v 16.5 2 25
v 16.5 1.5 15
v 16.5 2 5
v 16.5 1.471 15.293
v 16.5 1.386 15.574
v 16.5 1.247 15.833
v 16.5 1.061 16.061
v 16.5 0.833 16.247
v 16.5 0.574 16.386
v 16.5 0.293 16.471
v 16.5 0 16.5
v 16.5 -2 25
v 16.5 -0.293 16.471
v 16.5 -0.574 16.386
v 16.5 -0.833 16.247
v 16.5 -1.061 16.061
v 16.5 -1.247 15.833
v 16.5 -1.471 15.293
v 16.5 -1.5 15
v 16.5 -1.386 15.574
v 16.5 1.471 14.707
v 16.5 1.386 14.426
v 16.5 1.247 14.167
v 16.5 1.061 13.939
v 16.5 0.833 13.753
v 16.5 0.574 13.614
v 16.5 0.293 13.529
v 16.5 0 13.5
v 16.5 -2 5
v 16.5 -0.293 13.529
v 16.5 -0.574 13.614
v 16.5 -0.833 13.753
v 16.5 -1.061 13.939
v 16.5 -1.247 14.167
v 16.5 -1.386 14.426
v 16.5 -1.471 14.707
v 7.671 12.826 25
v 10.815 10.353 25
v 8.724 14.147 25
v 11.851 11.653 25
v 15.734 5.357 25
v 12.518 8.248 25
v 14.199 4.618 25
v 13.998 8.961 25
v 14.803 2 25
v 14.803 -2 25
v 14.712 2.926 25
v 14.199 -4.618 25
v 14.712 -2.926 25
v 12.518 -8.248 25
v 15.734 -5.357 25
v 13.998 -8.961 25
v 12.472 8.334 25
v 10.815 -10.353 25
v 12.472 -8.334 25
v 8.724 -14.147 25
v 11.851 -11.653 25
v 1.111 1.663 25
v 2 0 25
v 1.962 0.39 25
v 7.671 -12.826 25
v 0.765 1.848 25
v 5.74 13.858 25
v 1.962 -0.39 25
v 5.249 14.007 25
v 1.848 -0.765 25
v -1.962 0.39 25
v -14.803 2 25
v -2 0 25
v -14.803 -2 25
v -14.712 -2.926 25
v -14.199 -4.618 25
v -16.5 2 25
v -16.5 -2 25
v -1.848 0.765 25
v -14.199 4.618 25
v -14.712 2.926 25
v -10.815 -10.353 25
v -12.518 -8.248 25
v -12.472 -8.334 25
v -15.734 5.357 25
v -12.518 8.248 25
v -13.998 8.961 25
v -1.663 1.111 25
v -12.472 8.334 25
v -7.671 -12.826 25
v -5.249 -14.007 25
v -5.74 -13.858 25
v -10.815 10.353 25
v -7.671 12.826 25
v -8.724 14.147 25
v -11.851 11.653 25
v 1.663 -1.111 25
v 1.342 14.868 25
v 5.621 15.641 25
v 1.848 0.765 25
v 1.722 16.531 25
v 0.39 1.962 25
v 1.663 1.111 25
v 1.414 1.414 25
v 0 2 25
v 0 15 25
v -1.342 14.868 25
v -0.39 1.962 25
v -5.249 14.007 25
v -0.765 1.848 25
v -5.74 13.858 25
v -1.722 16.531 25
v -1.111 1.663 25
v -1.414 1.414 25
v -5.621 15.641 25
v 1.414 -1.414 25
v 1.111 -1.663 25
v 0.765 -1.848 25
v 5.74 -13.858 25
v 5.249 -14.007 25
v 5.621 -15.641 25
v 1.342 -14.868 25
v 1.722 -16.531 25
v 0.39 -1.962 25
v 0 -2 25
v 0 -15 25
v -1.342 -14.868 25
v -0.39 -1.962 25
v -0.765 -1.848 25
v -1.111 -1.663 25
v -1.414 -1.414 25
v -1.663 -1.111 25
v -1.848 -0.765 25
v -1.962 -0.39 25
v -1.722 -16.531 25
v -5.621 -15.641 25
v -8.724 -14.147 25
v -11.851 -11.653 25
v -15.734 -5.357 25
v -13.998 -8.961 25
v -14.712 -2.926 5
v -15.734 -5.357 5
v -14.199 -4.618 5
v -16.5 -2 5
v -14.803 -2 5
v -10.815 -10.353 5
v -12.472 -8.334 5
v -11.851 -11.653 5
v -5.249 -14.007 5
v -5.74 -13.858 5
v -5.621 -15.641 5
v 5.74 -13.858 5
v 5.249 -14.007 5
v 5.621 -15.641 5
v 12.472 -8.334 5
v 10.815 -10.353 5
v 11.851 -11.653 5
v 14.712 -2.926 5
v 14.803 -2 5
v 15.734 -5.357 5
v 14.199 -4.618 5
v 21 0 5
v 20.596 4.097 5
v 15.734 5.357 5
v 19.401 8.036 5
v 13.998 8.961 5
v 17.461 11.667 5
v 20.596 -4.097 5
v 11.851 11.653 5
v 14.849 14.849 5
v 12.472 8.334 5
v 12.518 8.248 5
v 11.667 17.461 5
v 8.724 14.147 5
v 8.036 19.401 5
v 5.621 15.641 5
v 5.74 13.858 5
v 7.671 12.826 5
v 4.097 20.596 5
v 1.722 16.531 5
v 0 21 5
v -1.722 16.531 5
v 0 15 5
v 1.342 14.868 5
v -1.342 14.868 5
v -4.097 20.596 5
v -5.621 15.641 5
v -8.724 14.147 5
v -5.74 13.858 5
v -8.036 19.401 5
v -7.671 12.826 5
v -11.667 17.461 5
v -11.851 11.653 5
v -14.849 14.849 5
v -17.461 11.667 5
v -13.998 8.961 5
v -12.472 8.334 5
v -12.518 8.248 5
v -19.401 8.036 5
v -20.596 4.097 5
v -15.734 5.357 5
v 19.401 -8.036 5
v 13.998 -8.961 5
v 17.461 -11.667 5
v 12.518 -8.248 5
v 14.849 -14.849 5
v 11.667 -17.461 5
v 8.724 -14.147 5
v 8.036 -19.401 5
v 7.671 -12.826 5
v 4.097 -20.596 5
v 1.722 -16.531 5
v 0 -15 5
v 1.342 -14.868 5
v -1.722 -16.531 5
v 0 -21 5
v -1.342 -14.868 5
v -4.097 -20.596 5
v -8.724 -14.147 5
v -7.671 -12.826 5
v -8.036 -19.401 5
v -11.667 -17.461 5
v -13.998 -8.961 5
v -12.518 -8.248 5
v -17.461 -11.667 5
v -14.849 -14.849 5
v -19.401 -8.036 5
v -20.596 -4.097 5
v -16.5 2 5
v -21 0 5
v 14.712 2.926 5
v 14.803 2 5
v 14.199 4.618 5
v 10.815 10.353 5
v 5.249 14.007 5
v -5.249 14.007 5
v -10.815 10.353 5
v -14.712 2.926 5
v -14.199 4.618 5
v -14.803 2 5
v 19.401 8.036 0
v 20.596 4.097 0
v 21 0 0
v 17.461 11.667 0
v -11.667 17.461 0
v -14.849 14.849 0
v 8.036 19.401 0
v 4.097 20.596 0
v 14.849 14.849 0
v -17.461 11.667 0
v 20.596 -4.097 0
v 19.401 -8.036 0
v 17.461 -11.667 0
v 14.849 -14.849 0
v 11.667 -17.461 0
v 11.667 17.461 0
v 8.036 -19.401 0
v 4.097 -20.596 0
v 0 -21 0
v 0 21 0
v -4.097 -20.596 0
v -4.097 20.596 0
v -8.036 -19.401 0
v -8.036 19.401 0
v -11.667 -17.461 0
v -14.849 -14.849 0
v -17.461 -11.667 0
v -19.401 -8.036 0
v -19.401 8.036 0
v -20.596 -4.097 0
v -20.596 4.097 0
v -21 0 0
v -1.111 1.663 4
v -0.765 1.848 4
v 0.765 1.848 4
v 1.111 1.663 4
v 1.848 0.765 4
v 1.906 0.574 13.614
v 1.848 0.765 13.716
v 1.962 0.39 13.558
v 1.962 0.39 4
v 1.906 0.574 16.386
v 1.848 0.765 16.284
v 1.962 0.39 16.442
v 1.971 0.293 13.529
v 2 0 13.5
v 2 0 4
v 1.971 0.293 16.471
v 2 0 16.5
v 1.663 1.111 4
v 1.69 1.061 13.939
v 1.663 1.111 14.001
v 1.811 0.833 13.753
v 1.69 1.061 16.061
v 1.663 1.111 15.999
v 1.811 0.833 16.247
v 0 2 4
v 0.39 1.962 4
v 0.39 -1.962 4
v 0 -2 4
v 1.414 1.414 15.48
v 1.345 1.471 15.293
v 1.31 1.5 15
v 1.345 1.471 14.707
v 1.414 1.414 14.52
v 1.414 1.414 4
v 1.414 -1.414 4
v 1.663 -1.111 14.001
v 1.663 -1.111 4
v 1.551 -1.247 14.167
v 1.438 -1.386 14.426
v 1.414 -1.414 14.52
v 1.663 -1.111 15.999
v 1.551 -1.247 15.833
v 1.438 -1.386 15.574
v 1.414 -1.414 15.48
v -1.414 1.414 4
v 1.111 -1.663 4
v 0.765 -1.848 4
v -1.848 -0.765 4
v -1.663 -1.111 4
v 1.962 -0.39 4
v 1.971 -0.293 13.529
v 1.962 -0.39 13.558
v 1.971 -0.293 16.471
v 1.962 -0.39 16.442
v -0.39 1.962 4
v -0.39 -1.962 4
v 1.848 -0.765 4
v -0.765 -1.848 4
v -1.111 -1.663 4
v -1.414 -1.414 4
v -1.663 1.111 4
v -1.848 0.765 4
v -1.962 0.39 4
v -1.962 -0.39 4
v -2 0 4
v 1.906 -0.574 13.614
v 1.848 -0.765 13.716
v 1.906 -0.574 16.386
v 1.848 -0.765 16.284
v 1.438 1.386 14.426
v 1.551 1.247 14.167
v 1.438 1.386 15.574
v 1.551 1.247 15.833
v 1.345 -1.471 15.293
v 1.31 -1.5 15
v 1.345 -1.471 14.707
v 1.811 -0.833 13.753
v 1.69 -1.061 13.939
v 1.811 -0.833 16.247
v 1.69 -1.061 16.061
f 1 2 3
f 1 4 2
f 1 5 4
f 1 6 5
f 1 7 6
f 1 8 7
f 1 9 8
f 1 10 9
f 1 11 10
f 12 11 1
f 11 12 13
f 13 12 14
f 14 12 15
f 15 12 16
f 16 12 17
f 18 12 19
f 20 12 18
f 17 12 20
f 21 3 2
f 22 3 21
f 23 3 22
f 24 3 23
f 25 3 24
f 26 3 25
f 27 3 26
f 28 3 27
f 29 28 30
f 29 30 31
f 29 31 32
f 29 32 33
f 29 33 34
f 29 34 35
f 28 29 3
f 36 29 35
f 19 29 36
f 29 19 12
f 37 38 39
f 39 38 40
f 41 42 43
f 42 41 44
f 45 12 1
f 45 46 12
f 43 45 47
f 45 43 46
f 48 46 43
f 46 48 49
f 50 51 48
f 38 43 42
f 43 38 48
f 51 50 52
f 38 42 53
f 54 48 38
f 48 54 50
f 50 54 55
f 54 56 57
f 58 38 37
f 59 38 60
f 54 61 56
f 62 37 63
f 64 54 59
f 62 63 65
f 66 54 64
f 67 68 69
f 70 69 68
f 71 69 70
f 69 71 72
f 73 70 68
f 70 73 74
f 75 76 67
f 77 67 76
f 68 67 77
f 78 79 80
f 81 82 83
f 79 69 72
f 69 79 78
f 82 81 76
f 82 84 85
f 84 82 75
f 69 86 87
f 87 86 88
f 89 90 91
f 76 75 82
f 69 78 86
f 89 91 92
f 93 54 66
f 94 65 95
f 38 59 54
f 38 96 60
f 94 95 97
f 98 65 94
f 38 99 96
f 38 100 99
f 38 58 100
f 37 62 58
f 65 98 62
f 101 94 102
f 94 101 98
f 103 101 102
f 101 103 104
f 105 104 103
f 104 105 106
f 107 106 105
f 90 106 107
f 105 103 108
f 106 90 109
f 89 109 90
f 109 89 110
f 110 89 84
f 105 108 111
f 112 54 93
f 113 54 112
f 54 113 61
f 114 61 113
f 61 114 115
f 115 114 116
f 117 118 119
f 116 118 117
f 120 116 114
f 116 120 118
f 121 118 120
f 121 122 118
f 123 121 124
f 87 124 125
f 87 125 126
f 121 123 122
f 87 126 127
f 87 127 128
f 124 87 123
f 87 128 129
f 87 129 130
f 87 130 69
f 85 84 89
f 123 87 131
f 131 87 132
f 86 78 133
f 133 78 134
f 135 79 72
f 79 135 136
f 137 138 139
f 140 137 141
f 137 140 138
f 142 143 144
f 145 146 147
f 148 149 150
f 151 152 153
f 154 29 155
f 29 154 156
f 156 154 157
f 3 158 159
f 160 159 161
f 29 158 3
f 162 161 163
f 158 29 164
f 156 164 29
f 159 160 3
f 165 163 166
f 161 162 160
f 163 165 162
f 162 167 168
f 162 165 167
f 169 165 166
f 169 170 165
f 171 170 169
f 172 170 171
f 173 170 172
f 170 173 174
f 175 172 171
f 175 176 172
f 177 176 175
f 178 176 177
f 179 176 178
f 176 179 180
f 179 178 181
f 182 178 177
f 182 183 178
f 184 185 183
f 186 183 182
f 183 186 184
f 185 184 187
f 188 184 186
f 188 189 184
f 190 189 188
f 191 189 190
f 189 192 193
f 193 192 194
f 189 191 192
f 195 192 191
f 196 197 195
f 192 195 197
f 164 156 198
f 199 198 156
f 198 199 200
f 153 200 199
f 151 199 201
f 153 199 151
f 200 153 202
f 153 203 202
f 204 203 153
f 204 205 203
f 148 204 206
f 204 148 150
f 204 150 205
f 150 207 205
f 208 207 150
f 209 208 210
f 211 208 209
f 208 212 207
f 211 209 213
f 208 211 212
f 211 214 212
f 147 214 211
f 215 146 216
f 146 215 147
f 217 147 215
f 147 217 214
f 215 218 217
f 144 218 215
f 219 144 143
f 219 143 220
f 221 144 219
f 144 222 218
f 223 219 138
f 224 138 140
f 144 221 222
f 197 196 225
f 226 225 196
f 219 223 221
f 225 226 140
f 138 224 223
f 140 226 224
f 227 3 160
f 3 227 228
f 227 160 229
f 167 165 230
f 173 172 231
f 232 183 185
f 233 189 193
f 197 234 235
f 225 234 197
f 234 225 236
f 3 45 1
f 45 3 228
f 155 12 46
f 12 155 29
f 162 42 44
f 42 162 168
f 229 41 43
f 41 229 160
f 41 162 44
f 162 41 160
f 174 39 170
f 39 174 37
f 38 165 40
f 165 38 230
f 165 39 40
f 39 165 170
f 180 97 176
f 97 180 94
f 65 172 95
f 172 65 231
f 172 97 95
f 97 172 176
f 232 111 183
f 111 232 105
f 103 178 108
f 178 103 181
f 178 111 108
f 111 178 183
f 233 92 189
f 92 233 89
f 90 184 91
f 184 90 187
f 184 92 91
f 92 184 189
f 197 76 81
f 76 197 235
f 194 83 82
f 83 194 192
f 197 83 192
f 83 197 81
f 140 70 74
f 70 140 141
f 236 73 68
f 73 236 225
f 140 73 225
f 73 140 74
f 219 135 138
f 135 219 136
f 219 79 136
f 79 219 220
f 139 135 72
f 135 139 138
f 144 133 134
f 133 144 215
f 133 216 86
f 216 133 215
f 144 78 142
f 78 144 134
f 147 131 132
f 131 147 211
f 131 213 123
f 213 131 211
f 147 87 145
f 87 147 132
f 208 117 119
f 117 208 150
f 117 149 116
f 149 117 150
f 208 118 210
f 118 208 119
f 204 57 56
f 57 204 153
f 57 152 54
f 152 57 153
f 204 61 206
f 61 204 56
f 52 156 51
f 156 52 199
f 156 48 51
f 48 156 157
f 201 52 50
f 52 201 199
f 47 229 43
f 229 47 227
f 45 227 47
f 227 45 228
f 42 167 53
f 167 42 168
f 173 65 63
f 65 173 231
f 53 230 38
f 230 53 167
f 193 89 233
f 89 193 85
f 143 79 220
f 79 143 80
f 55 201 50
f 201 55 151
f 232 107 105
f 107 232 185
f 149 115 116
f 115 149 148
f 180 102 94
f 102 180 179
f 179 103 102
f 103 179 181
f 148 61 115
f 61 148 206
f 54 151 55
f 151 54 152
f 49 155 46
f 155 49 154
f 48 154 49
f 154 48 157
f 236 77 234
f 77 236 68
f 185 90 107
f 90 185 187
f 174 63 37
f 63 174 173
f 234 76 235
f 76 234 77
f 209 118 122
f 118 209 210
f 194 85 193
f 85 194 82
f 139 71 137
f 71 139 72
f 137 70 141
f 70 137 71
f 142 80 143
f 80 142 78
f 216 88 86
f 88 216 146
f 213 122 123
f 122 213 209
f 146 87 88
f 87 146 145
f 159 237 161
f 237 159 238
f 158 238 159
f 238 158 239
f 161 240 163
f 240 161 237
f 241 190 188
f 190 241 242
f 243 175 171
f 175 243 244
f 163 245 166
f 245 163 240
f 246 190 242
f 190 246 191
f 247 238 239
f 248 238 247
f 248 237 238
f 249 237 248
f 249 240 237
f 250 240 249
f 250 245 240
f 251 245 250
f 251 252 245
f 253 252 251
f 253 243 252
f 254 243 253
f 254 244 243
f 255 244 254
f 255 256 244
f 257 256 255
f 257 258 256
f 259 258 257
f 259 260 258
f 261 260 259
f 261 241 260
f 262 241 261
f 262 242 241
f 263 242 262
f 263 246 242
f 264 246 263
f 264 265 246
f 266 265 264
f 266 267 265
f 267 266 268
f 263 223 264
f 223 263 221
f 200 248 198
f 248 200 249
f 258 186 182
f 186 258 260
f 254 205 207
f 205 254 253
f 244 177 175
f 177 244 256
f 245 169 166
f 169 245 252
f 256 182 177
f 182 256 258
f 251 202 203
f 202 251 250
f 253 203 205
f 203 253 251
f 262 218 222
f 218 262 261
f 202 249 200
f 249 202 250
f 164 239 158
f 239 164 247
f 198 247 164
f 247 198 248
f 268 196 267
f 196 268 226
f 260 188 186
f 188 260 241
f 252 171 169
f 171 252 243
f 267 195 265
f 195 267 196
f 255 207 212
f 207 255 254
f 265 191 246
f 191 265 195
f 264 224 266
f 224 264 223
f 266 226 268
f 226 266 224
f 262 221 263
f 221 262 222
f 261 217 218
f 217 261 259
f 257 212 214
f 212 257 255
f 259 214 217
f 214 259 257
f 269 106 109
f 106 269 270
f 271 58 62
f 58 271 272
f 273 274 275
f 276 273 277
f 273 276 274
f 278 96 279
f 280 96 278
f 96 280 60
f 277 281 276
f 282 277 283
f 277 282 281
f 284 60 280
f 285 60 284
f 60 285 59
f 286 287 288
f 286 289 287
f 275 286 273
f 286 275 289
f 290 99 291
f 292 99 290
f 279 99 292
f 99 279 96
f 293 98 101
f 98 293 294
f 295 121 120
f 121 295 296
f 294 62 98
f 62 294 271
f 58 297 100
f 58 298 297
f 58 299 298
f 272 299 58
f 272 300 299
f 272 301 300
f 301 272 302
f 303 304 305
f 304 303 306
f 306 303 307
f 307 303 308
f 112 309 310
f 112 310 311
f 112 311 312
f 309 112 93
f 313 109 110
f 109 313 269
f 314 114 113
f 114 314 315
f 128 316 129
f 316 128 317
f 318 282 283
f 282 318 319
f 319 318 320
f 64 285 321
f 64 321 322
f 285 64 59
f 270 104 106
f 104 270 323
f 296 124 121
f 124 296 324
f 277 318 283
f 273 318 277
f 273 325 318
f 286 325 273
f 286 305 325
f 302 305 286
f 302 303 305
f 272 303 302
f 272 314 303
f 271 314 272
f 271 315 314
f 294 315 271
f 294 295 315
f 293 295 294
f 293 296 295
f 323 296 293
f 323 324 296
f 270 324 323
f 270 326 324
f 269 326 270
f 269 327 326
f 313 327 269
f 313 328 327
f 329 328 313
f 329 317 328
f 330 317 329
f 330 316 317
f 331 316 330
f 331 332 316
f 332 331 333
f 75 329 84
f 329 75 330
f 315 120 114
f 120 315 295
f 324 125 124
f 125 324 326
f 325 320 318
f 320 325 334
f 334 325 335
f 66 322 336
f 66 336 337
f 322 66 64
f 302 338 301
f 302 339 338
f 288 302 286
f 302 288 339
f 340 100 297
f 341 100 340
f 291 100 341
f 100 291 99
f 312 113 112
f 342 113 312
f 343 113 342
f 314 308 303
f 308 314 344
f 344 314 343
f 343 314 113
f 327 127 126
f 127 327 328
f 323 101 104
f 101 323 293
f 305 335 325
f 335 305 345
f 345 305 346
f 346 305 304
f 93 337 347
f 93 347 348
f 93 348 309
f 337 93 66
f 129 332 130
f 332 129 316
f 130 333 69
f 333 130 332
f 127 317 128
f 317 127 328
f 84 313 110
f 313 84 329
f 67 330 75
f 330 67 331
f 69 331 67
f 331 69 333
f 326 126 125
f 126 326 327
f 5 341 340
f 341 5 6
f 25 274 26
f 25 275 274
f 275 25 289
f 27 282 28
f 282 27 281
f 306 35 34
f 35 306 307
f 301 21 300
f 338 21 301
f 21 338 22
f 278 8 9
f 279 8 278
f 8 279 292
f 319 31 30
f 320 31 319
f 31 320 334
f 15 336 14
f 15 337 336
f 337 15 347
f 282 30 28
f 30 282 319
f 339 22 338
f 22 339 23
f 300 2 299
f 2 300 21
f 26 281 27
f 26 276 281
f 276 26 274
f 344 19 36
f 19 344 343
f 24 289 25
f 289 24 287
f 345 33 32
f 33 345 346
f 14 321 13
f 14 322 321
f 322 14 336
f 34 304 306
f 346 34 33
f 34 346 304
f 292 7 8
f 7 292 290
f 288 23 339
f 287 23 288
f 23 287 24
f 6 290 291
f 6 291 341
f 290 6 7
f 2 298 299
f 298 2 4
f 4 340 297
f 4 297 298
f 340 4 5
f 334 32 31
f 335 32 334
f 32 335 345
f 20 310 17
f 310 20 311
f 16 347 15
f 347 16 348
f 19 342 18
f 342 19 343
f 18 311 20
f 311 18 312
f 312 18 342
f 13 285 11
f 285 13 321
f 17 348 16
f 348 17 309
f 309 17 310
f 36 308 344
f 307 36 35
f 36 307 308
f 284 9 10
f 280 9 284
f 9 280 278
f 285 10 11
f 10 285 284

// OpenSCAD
$fn = 32;

// ----------------------------------------------------------------------
// Control knob: skirt knob with grip ribs
// ----------------------------------------------------------------------

// --- parameters (mm) ---
skirt_d = 42;             // skirt diameter
skirt_t = 5;              // skirt thickness
rib_w = 4;                // grip rib width
rib_out = 2.5;            // grip rib radial protrusion
n_ribs = 14;              // number of grip ribs
knob_d = 30;              // knob body diameter
knob_h = 20;              // knob body height
bore_d = 4;               // shaft bore diameter
set_d = 3;                // set screw bore diameter
fit_tol = 0.1;            // tolerance for press fits, mm
free_tol = 0.3;           // tolerance for clearance fits, mm

rib_step = 360 / n_ribs;  // rib angular step
total_h = skirt_t + knob_h;  // overall height

difference() {
  union() {
    translate([0, 0, skirt_t]) cylinder(h = knob_h, d = knob_d);
    cylinder(h = skirt_t, d = skirt_d);
    for (i = [0 : n_ribs - 1])
      rotate([0, 0, i * rib_step])
        translate([knob_d / 2 - 1, -rib_w / 2, skirt_t])
          cube([rib_out, rib_w, knob_h]);
  }
  translate([0, 0, skirt_t - 1]) cylinder(h = knob_h + 2, d = bore_d);
  translate([-1, 0, skirt_t + knob_h / 2]) rotate([0, 90, 0])
    cylinder(h = knob_d / 2 + bore_d / 2 + 2, d = set_d);
}
